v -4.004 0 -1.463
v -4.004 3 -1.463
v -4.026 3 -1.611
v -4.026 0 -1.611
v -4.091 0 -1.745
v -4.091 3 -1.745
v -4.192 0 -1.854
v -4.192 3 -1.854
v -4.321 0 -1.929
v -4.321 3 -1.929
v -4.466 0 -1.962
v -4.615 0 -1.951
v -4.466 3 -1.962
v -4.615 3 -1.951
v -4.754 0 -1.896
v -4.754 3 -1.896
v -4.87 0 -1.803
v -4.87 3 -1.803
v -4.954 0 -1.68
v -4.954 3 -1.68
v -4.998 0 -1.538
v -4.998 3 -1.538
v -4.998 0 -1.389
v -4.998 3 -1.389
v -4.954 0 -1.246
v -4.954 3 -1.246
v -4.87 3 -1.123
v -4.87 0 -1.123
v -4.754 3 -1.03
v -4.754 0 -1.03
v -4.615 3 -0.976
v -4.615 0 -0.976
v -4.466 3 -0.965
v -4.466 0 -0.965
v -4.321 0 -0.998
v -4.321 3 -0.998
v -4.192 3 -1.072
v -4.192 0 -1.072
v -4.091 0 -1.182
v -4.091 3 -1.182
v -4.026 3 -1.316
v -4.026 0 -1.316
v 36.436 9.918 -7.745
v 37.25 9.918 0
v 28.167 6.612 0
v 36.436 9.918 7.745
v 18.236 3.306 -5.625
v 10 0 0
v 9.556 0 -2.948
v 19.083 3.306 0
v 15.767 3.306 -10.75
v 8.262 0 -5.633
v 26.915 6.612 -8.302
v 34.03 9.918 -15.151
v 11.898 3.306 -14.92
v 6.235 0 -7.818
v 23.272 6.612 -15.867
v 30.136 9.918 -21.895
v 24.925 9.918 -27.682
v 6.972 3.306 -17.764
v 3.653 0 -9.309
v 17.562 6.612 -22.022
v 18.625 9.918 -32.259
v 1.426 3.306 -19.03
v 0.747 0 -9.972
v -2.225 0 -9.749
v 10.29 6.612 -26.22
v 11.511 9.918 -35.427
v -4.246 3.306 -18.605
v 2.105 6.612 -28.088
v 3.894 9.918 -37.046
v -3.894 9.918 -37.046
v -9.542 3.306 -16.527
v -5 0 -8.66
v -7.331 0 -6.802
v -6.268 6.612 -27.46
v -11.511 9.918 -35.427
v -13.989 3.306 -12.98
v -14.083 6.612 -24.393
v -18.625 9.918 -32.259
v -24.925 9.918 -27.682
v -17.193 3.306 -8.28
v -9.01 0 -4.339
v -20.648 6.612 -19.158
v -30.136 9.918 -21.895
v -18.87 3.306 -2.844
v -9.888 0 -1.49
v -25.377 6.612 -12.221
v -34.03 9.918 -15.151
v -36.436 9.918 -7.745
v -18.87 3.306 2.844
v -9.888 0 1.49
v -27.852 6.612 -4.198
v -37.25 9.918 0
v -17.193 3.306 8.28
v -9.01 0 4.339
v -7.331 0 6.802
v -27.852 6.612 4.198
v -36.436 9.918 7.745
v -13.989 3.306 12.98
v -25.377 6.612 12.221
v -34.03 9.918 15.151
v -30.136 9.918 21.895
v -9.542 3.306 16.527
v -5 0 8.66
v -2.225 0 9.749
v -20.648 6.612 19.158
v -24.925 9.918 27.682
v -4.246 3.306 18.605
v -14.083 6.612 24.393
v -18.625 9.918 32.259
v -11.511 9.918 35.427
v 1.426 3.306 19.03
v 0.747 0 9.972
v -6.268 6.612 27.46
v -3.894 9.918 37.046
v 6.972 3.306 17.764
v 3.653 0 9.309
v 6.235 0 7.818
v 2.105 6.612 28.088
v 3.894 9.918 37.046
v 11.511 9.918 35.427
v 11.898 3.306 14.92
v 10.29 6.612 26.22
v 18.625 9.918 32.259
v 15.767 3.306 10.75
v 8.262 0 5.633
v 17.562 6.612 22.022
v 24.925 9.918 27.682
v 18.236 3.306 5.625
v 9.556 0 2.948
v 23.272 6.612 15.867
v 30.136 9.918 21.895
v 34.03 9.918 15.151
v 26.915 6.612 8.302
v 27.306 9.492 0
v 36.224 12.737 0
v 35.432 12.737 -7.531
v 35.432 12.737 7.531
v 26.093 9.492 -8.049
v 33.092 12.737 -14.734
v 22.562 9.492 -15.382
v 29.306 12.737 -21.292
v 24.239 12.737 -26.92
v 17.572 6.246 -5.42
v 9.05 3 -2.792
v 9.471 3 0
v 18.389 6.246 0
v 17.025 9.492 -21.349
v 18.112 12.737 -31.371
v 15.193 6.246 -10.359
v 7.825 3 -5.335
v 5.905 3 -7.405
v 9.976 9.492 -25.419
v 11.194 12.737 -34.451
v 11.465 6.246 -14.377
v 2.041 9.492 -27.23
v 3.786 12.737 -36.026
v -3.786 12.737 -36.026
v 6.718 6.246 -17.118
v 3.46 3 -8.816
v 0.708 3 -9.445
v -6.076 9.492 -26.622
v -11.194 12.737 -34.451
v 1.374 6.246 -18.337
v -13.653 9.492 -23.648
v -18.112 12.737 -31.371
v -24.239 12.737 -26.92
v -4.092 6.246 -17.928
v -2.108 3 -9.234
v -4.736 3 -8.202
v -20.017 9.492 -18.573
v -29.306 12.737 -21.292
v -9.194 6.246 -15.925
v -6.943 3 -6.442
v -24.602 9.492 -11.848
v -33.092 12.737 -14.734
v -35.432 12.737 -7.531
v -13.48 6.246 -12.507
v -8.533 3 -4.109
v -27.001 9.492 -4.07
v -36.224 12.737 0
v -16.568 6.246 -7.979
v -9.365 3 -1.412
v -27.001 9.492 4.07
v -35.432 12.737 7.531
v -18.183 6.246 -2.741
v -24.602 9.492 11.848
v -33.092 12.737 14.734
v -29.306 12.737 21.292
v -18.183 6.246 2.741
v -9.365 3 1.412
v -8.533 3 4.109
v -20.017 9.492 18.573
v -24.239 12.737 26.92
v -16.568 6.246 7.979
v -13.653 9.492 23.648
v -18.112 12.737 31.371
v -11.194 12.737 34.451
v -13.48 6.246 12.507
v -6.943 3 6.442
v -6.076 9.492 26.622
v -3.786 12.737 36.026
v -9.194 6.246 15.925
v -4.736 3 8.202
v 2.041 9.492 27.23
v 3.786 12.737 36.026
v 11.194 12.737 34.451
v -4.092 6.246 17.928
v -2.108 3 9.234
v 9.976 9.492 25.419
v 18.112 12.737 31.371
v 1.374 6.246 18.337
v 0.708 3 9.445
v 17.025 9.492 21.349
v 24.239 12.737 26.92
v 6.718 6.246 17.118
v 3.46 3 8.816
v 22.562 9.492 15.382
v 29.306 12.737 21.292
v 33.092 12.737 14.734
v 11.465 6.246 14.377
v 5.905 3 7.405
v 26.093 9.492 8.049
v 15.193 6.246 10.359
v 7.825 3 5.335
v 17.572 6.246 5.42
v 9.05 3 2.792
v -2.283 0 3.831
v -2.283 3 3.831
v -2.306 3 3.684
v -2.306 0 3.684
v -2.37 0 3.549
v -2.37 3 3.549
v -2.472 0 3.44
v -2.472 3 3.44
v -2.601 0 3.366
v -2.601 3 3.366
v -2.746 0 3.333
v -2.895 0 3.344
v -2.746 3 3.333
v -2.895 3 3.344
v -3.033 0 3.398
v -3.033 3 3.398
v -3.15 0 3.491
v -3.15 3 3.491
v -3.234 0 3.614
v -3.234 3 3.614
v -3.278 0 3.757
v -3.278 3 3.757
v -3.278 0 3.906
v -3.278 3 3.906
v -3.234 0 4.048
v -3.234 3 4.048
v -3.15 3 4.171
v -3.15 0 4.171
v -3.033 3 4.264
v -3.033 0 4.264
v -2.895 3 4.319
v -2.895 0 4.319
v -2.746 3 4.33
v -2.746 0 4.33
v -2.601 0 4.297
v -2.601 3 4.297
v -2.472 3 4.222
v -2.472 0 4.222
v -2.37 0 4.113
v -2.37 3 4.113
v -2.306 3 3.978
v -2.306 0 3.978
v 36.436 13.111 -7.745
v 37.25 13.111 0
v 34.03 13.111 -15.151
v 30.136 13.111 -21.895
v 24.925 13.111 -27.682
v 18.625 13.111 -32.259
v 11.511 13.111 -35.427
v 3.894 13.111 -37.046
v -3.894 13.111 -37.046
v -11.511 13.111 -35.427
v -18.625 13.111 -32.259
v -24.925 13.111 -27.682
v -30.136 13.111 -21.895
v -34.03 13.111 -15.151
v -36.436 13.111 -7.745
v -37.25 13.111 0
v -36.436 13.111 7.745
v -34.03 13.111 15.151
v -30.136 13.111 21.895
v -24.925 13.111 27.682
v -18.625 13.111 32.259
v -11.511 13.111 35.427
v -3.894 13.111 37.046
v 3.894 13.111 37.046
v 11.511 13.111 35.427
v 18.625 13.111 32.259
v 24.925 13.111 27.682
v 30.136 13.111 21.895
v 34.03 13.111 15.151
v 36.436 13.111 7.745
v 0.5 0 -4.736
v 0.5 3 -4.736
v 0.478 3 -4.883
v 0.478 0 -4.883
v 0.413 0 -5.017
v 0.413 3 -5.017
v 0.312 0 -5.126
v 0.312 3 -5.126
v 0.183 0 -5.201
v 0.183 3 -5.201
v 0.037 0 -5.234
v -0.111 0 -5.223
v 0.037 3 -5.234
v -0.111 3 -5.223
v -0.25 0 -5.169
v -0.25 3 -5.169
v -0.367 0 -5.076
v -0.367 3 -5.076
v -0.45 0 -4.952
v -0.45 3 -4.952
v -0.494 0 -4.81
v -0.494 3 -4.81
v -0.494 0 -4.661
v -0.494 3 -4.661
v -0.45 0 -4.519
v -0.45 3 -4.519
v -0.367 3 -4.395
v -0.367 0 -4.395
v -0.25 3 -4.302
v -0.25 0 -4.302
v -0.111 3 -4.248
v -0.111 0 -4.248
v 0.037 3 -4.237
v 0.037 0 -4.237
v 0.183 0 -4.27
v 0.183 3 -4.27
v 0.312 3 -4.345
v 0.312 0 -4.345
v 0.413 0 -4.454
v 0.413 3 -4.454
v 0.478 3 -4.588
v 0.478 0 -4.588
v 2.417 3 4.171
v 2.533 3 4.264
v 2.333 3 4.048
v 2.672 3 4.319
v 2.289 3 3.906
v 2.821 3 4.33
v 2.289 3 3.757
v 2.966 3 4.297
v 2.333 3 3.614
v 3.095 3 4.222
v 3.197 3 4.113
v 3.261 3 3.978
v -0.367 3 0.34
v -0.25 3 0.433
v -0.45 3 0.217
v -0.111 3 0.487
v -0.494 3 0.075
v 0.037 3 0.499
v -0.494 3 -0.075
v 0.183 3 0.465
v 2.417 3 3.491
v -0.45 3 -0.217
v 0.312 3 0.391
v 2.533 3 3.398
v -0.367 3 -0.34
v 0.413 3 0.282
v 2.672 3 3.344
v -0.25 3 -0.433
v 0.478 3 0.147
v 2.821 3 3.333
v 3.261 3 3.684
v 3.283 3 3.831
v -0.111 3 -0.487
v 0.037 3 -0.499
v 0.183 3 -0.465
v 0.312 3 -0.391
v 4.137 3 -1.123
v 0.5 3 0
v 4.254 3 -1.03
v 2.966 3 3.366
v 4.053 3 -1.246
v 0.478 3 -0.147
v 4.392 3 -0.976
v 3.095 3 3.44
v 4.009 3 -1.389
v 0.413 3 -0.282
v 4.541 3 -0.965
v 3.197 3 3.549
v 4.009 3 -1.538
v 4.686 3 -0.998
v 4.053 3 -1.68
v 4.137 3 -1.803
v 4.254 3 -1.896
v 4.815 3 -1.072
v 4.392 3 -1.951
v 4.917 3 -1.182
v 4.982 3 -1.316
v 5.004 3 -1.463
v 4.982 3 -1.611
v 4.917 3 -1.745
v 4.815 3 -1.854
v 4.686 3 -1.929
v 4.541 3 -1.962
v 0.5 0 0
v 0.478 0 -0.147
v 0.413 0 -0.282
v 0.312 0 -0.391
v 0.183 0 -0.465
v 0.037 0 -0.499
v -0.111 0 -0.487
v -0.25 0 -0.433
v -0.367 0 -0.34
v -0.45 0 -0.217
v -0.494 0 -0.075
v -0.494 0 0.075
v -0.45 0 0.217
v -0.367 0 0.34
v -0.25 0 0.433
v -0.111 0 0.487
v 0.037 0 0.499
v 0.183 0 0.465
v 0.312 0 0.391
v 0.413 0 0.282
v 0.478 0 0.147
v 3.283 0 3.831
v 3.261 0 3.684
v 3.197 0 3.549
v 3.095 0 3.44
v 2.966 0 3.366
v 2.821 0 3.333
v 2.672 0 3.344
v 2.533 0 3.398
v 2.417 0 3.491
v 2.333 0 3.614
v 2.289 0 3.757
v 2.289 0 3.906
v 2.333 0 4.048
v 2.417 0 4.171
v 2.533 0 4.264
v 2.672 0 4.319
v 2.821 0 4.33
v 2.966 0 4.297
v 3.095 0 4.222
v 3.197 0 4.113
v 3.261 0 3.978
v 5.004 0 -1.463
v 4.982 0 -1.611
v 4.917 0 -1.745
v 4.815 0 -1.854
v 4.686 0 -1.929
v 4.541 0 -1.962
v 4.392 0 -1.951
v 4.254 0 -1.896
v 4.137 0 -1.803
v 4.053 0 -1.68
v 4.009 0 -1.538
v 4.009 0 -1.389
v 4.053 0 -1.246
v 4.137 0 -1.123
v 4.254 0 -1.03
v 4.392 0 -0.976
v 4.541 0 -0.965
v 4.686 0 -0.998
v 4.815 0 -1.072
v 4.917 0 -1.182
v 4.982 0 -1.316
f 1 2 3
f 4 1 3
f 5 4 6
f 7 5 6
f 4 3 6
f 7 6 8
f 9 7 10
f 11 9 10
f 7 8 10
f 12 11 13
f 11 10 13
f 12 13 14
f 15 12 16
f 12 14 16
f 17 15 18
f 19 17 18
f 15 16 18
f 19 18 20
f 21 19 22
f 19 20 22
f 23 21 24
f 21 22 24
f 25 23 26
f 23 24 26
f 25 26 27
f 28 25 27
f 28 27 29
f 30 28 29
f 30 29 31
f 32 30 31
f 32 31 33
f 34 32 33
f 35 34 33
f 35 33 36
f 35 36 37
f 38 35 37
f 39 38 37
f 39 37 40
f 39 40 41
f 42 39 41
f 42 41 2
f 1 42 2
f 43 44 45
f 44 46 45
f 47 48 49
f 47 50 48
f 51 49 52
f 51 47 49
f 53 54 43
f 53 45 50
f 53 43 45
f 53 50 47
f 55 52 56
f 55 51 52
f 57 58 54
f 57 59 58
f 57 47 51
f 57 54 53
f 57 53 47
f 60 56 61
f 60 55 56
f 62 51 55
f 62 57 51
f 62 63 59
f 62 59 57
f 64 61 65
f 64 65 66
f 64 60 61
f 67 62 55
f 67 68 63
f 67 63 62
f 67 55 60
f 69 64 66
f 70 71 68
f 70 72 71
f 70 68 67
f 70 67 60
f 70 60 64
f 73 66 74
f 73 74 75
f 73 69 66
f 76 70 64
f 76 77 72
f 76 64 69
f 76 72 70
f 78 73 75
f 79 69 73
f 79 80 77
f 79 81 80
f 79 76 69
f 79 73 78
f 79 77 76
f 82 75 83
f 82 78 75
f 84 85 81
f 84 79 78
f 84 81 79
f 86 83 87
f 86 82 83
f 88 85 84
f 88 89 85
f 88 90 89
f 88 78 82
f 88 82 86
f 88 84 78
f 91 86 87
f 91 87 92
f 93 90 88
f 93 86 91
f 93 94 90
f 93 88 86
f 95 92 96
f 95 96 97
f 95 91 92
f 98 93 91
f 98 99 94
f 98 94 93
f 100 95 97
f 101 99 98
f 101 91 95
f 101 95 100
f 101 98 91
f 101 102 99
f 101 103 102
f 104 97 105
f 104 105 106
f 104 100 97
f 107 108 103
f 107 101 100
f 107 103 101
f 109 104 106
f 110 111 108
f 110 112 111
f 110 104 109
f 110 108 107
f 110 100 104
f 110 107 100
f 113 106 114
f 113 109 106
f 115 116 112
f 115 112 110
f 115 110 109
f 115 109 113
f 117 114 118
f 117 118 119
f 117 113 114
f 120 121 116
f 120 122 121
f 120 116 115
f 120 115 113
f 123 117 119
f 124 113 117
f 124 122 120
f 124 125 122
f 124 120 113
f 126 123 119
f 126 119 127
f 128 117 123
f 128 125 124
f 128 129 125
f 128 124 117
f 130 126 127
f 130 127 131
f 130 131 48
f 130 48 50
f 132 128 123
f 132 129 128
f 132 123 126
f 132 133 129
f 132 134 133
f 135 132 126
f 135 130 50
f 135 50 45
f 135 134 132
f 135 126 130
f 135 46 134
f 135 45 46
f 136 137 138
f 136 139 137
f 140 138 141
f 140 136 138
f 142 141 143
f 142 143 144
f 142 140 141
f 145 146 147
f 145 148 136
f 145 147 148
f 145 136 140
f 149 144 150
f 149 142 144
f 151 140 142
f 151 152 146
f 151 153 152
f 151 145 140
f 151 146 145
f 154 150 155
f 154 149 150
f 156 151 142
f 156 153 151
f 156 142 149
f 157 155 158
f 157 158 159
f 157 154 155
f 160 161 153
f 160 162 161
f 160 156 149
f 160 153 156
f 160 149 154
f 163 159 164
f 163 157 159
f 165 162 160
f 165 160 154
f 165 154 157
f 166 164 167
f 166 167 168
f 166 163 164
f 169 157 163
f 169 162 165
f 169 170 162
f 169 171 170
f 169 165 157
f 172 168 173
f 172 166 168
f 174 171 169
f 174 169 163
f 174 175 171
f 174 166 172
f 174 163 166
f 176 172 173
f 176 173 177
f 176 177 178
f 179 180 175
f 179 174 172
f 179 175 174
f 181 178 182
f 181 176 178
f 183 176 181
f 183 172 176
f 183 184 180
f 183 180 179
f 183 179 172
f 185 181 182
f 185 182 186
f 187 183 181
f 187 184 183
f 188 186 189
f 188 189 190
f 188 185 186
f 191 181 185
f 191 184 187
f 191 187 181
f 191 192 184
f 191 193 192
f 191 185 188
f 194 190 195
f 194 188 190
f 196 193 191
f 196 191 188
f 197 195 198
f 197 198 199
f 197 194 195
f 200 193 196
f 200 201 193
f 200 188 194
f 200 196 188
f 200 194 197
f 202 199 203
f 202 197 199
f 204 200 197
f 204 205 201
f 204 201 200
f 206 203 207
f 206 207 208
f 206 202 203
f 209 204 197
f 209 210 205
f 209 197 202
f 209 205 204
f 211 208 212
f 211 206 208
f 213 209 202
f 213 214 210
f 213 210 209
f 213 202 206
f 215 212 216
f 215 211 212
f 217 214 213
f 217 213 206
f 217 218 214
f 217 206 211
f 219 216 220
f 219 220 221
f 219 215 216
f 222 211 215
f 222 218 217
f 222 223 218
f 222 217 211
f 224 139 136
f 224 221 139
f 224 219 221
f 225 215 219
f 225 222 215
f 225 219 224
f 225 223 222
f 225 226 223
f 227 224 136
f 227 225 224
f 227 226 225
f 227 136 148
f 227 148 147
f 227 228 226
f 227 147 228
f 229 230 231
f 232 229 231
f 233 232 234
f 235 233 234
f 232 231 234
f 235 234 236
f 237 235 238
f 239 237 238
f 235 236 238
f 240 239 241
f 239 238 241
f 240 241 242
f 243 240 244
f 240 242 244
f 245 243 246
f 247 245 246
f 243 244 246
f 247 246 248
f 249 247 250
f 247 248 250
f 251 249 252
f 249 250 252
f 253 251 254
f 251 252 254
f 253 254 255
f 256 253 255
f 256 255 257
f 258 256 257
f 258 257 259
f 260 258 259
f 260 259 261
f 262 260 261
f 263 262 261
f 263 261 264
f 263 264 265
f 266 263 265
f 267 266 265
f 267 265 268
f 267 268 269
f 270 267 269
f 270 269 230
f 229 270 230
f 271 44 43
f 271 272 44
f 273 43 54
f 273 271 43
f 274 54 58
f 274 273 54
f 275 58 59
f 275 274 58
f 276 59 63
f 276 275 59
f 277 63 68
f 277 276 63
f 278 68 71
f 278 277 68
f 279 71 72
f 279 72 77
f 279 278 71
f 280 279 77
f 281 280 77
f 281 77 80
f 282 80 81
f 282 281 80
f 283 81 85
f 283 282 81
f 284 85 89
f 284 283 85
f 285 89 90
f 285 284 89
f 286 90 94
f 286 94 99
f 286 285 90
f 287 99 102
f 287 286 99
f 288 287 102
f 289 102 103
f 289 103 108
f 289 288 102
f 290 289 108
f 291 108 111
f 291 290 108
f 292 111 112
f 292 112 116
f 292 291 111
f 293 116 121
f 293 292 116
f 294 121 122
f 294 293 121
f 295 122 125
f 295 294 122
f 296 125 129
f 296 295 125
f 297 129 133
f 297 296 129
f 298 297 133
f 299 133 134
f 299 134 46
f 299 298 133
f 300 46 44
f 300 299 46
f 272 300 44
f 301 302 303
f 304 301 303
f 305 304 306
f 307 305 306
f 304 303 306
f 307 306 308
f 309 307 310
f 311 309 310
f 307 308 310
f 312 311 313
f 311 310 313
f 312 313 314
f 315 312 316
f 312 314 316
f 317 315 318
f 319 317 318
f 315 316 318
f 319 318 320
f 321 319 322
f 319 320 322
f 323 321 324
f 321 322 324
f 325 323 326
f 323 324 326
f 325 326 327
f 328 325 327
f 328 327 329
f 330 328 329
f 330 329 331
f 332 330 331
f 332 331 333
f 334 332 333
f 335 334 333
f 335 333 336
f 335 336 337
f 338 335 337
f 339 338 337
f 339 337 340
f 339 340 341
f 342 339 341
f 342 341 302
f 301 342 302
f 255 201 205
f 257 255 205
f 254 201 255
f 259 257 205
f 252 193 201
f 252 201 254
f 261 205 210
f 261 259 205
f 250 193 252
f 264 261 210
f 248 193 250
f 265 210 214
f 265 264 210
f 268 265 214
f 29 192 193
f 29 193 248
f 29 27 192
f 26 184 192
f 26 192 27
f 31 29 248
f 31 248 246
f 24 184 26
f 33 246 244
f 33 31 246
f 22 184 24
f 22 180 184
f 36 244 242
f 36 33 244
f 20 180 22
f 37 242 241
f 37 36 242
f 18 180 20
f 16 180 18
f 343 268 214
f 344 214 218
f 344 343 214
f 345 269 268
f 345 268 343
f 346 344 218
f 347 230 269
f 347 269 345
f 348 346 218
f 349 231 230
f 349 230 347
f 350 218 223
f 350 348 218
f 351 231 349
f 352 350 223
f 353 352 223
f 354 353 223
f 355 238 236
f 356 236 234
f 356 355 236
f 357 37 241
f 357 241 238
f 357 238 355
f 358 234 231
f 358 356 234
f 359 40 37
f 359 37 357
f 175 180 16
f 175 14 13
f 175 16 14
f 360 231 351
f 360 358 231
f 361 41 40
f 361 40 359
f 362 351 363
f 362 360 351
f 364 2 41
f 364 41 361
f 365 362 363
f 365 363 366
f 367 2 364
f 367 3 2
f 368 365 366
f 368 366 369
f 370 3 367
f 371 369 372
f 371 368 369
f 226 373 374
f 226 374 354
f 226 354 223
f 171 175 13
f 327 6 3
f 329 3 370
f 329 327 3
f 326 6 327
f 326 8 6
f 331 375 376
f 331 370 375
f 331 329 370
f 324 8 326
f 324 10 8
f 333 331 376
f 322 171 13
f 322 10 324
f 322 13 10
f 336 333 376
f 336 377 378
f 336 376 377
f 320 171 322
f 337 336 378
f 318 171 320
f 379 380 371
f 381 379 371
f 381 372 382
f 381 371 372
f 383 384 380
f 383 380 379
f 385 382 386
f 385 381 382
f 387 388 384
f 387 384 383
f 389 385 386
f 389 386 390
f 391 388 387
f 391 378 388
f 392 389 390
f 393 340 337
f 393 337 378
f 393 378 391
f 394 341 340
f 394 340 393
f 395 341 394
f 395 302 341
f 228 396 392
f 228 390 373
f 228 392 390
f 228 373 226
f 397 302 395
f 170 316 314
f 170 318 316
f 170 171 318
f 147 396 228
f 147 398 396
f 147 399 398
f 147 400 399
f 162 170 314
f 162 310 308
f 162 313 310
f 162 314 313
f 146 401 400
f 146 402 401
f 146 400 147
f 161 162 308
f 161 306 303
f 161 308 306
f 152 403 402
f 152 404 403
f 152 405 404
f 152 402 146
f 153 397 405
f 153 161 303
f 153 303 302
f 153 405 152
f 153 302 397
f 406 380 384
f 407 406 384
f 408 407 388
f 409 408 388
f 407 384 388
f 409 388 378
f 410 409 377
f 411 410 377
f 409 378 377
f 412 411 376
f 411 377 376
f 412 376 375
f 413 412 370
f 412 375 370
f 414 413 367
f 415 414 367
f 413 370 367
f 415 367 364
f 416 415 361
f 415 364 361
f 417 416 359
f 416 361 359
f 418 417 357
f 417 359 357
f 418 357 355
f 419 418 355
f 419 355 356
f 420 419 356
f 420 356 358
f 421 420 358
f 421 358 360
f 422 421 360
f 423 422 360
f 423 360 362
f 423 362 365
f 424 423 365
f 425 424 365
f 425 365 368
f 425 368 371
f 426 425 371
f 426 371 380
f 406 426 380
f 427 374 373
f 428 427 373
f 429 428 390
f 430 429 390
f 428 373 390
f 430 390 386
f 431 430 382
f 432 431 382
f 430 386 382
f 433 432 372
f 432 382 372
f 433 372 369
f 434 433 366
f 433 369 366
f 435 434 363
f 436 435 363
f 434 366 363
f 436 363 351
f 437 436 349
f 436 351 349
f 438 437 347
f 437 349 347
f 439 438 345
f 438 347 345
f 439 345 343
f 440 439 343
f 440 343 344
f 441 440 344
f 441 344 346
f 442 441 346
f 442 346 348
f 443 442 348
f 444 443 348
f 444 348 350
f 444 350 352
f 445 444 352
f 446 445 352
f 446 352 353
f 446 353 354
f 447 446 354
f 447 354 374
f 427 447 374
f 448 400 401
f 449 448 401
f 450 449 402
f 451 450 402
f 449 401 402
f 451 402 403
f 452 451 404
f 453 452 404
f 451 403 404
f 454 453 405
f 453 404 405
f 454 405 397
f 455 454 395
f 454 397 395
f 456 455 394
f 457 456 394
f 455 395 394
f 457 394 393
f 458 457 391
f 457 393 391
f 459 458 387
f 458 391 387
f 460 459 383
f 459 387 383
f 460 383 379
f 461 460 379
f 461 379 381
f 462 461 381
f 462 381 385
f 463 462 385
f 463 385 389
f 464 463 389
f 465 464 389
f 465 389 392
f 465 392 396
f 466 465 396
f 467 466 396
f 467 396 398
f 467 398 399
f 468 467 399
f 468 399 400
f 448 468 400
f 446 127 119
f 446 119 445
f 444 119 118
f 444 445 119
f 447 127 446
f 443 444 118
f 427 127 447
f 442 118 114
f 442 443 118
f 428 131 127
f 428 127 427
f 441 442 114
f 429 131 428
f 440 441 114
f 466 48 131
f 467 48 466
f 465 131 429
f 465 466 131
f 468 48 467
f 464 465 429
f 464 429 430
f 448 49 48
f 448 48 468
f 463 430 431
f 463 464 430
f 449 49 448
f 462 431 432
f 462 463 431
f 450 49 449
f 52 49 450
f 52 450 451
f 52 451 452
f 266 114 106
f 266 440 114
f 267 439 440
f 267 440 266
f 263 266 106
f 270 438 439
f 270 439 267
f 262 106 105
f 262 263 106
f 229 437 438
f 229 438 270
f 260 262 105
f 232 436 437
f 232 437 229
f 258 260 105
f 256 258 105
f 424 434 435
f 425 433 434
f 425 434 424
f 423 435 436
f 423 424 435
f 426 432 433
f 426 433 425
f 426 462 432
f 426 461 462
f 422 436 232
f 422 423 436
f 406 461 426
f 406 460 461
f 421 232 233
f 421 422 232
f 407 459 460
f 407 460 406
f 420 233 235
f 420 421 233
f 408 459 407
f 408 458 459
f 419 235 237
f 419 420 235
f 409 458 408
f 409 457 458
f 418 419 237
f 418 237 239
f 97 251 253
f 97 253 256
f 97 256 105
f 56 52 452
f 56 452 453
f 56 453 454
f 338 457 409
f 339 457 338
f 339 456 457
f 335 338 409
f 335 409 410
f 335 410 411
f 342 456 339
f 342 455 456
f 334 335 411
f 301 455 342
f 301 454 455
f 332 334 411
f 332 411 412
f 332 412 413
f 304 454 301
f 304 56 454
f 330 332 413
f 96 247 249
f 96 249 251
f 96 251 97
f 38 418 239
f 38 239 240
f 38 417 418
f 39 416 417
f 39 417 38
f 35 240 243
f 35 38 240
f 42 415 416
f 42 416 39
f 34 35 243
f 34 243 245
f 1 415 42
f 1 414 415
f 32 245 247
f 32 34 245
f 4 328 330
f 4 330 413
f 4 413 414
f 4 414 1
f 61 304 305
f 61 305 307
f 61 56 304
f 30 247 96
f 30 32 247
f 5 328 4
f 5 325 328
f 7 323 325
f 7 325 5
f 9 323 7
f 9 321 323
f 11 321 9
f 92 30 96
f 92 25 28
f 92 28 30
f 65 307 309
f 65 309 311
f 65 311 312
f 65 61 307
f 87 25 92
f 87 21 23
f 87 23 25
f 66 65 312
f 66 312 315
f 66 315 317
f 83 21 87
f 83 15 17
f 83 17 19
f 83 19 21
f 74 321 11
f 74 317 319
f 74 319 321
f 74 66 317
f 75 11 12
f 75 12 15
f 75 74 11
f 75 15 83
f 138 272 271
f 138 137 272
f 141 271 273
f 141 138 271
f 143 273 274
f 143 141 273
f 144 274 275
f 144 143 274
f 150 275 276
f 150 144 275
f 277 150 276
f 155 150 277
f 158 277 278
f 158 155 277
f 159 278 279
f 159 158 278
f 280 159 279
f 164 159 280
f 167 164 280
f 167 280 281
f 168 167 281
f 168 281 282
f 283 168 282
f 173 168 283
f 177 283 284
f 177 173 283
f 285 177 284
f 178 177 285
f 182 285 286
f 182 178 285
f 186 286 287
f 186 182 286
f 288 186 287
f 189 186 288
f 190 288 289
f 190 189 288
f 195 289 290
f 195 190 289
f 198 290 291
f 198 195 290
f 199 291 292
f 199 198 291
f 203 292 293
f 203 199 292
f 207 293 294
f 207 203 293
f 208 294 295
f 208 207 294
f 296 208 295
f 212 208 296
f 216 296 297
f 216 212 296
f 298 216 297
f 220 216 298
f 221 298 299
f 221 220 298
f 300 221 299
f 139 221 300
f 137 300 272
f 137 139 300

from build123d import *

# Parameters (mm, degrees)
SKETCH2_R          = 0.5
CUT_EXTRUDE1_DEPTH = 18


with BuildPart() as part:
    # Sketch1 → Revolve1 (revolve)
    with BuildSketch(Plane.XY):
        Polygon((0, 0), (10, 0), (37.25, 9.918188884), (37.25, 13.110722201), (36.22393957, 12.737266746), (9.471019058, 3), (0, 3), align=None)
    revolve(axis=Axis((0, 0, 0), (0, 1, 0)))

    # Sketch2 → Cut-Extrude1 (cut)
    with BuildSketch(Plane(origin=(0, 3, 0), x_dir=(1, 0, 0), z_dir=(0, 1, 0))):
        with Locations((0, 4.735509529)):
            Circle(SKETCH2_R)
        Circle(SKETCH2_R)
        with Locations((4.503737195, 1.463352921)):
            Circle(SKETCH2_R)
        with Locations((2.783462663, -3.831107686)):
            Circle(SKETCH2_R)
        with Locations((-2.783462663, -3.831107686)):
            Circle(SKETCH2_R)
        with Locations((-4.503737195, 1.463352921)):
            Circle(SKETCH2_R)
    extrude(amount=-CUT_EXTRUDE1_DEPTH, mode=Mode.SUBTRACT)


solid = part.part
